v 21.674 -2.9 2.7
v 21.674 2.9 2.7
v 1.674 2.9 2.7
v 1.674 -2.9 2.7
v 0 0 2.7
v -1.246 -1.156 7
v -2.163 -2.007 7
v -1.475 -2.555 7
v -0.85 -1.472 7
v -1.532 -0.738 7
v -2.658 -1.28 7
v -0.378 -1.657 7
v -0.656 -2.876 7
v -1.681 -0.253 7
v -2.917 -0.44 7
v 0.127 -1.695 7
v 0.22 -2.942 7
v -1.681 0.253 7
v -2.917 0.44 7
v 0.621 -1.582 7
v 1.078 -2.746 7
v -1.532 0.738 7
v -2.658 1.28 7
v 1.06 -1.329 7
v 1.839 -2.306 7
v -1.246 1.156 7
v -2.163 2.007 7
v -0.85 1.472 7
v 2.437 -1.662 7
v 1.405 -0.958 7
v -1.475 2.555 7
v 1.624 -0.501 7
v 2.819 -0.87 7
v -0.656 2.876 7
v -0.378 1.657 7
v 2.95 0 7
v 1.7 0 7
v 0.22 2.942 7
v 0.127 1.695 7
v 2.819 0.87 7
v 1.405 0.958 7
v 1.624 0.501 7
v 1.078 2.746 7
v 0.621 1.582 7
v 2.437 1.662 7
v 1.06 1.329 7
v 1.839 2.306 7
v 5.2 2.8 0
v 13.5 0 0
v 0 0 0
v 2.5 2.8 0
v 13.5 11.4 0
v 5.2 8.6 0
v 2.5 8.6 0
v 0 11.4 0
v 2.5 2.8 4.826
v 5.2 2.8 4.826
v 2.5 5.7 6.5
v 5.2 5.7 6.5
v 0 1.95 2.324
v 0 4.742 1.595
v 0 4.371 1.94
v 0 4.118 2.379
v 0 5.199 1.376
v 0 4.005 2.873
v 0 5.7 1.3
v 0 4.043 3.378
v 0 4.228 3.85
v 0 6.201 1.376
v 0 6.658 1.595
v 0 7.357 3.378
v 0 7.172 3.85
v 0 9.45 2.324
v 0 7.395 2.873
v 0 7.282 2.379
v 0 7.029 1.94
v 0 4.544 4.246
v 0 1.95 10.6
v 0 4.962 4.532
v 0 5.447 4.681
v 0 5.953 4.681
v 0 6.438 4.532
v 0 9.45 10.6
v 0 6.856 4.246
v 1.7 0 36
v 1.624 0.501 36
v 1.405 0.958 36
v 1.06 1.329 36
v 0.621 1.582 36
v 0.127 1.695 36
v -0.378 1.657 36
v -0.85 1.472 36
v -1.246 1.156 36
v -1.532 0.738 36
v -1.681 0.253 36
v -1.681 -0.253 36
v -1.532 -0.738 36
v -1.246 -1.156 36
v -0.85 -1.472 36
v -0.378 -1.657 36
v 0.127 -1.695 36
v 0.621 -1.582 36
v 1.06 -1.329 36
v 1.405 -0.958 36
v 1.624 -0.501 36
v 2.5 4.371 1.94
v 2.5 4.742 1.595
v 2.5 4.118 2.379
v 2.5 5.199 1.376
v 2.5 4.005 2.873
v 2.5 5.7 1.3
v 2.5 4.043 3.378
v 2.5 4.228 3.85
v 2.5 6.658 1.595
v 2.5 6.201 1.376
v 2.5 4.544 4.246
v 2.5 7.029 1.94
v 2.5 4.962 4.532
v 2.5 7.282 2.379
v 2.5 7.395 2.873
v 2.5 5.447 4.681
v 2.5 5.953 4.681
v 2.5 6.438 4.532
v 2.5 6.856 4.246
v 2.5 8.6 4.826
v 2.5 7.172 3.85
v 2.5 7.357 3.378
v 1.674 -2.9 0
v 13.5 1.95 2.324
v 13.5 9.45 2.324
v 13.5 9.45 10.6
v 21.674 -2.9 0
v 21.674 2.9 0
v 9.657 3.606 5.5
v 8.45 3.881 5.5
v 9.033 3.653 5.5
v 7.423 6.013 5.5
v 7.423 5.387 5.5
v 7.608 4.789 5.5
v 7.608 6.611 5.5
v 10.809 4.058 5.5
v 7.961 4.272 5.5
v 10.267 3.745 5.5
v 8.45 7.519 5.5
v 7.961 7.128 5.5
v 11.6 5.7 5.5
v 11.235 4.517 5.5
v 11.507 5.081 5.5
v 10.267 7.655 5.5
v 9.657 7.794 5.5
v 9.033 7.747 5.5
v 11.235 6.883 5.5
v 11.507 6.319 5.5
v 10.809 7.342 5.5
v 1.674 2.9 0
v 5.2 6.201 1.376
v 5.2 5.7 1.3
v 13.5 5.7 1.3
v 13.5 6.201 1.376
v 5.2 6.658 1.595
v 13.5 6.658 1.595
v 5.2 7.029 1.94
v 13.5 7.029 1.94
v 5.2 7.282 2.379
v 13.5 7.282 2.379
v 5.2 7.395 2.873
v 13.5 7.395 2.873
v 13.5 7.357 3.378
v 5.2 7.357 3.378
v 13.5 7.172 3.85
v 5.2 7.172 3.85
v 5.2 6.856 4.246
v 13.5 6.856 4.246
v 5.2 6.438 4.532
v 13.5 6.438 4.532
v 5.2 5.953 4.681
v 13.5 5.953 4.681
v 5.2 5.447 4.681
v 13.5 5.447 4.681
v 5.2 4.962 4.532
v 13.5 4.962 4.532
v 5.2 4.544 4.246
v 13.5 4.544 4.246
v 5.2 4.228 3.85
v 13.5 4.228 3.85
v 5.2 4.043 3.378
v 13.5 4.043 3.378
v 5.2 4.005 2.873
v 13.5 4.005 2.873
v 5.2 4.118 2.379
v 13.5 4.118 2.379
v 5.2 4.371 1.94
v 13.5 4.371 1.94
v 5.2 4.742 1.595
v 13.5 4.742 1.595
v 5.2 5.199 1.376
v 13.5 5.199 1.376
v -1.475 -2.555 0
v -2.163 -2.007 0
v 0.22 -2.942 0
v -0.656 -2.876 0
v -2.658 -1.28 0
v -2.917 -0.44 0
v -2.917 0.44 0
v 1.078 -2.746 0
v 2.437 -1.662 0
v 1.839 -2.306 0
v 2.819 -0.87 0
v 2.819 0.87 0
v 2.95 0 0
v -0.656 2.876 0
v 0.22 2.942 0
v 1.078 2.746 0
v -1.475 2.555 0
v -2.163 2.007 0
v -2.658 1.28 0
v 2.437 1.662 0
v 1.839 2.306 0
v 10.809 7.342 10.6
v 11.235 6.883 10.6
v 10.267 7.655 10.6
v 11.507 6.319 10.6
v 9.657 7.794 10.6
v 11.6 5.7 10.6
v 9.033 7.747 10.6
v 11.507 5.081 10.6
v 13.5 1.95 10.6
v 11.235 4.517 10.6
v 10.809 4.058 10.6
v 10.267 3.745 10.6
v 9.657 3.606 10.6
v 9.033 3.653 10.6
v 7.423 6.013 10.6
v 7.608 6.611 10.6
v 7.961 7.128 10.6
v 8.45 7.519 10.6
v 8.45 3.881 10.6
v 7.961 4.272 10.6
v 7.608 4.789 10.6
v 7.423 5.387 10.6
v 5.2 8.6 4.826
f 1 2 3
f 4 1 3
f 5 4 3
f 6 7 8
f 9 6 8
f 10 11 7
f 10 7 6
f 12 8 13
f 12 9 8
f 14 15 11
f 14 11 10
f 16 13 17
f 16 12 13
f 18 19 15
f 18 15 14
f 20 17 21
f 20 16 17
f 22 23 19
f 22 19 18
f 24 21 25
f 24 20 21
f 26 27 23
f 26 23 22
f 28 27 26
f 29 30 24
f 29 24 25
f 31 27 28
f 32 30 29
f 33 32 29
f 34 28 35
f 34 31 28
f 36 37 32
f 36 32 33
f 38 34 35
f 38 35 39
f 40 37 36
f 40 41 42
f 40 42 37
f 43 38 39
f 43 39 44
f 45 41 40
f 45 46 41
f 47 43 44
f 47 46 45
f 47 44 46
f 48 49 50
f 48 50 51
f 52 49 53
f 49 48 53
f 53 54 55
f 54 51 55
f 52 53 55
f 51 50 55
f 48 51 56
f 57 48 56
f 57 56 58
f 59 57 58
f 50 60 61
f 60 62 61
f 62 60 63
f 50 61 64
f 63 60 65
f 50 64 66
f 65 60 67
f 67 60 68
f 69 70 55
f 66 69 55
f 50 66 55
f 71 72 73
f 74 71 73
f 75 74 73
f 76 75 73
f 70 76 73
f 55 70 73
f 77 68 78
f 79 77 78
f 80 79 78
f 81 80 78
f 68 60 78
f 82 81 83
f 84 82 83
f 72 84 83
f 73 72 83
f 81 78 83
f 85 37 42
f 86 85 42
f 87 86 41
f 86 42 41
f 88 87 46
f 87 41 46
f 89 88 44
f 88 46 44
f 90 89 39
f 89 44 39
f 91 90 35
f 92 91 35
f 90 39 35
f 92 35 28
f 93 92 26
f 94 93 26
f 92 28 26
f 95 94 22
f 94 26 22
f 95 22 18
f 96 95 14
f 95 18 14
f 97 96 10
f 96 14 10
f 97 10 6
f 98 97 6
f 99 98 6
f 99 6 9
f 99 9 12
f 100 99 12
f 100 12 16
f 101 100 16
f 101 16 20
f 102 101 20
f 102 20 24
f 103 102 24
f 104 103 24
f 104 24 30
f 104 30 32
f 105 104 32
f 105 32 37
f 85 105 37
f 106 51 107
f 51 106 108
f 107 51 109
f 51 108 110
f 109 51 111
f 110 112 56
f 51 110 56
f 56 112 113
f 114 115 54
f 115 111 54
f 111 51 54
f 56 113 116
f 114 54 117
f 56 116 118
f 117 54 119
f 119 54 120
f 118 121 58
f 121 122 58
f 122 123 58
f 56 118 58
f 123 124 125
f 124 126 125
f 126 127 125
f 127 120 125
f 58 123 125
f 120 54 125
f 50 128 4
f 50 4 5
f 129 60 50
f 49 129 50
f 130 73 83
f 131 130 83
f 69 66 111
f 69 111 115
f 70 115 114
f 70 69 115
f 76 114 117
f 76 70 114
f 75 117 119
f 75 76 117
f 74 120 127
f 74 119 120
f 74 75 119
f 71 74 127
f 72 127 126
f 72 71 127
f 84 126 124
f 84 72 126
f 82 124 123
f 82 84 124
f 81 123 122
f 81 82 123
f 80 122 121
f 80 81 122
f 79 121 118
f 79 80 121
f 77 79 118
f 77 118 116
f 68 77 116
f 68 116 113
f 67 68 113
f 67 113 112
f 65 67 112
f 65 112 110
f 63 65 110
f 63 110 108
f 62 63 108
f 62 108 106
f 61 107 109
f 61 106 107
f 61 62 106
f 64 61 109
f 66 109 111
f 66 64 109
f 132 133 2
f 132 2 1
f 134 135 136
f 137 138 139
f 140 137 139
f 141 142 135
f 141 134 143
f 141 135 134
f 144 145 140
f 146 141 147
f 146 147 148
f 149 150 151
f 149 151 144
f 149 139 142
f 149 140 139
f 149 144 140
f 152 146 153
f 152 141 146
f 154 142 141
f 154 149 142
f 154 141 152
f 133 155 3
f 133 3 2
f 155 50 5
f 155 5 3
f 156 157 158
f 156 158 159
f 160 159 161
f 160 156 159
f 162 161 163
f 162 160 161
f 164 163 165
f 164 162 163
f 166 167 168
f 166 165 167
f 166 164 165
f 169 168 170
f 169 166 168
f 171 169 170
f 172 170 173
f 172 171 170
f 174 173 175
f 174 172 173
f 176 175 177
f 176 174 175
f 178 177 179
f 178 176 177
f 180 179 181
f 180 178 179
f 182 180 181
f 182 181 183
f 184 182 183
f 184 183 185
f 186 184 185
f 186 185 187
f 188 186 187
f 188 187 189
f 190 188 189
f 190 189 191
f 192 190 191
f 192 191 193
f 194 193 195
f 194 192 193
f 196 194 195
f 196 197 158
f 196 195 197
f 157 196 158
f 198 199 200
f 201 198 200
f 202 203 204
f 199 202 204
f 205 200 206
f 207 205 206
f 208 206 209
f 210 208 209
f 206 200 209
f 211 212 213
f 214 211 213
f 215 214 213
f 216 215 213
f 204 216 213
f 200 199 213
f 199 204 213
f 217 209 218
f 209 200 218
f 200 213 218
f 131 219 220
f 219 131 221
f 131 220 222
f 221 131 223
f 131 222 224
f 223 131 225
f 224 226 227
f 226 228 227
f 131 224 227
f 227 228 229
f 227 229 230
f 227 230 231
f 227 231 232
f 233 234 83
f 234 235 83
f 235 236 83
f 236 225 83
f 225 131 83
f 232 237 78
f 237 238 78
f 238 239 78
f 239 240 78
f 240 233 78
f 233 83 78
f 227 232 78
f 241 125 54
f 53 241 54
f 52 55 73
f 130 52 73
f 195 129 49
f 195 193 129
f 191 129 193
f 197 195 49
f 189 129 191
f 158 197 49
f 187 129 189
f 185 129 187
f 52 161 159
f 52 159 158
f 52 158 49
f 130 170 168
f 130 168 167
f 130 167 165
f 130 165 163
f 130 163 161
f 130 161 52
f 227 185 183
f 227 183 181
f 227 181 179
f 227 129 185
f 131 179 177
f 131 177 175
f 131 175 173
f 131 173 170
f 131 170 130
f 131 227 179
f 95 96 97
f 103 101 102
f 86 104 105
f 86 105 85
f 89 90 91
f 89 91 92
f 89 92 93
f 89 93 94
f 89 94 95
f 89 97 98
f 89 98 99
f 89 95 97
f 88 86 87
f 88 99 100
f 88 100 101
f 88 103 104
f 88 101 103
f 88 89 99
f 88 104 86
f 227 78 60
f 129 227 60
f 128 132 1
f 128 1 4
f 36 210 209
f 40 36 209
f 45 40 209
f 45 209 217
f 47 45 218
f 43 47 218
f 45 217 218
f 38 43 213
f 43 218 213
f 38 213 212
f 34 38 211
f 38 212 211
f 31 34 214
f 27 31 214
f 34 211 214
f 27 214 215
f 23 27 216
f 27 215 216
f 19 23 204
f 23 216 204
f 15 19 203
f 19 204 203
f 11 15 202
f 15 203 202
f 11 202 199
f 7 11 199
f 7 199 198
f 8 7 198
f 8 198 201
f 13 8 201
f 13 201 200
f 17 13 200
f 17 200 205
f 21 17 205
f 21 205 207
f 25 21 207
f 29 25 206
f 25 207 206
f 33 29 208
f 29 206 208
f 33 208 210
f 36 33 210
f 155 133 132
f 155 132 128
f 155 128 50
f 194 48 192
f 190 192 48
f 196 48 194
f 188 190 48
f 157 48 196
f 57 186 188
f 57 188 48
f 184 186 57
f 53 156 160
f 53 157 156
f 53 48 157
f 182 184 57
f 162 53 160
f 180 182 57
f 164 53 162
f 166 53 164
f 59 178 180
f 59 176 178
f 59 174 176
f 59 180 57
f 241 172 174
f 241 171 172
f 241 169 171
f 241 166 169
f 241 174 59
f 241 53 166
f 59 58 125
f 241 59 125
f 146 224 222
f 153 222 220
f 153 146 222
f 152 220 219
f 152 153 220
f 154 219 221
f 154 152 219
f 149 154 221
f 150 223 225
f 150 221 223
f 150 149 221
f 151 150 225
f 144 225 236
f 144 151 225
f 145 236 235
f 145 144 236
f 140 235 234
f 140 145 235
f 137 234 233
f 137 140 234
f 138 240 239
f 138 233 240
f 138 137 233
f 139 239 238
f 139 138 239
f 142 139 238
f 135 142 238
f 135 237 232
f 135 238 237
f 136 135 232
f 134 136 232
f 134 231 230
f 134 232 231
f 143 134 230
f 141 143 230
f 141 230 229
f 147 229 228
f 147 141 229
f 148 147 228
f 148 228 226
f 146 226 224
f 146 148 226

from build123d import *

# Parameters (mm, degrees)
CYLINDER_R           = 2.95
CYLINDER_DEPTH       = 7
CYLINDER001_R        = 1.7
CYLINDER001_DEPTH    = 30
PAD002_DEPTH         = 2.7
CLONE001_PITCH_ANGLE = 90
CLONE_PITCH_ANGLE    = 90
CYLINDER002_R        = 2.1
CYLINDER002_DEPTH    = 10
PAD_DEPTH            = 13.5


with BuildPart() as m3bolthead:
    # Cylinder → Cylinder (new body)
    with BuildSketch(Plane.XY):
        Circle(CYLINDER_R)
    extrude(amount=CYLINDER_DEPTH)


with BuildPart() as m3bolt:
    # Cylinder001 → Cylinder001 (new body)
    with BuildSketch(Plane.XY.offset(6)):
        Circle(CYLINDER001_R)
    extrude(amount=CYLINDER001_DEPTH)

    # Fusion: union M3BoltHead
    add(m3bolthead.part)


with BuildPart() as m3nuthousing:
    # Sketch003 → Pad002 (new body)
    with BuildSketch(Plane.XY):
        Polygon((0, 0), (1.674316, 2.9), (21.674316, 2.9), (21.674316, -2.9), (1.674316, -2.9), align=None)
    extrude(amount=PAD002_DEPTH)


with BuildPart() as clone_of_m3bolt:
    # Clone001 base: copy of M3Bolt
    add(m3bolt.part)


with BuildPart() as clone_of_m3bolt_1:
    # Clone001 pitch: moved
    add(clone_of_m3bolt.part.rotate(Axis((0, 0, 0), (0, 1, 0)), CLONE001_PITCH_ANGLE))


with BuildPart() as clone_of_m3bolt_2:
    # Clone001 placement: moved
    add(clone_of_m3bolt_1.part.moved(Location((-16.5, 5.7, 3))))


with BuildPart() as clone_of_m3nuthousing:
    # Clone base: copy of M3NutHousing
    add(m3nuthousing.part)


with BuildPart() as clone_of_m3nuthousing_1:
    # Clone pitch: moved
    add(clone_of_m3nuthousing.part.rotate(Axis((0, 0, 0), (0, 1, 0)), CLONE_PITCH_ANGLE))


with BuildPart() as clone_of_m3nuthousing_2:
    # Clone placement: moved
    add(clone_of_m3nuthousing_1.part.moved(Location((2.5, 5.7, 6.5))))


with BuildPart() as fusion001:
    # Cylinder002 → Cylinder002 (new body)
    with BuildSketch(Plane(origin=(9.5, 5.7, 5.5), x_dir=(1, 0, 0), z_dir=(0, 0, 1))):
        Circle(CYLINDER002_R)
    extrude(amount=CYLINDER002_DEPTH)

    # Fusion001: union Clone of M3Bolt, Clone of M3NutHousing
    add(clone_of_m3bolt_2.part)
    add(clone_of_m3nuthousing_2.part)


with BuildPart() as art3tensionerbody:
    # Sketch027 → Pad (new body)
    with BuildSketch(Plane.YZ):
        Polygon((1.95, 2.32392), (0, 0), (11.4, 0), (9.45, 2.32392), (9.45, 10.6), (1.95, 10.6), align=None)
    extrude(amount=PAD_DEPTH)

    # Cut: cut Fusion001
    add(fusion001.part, mode=Mode.SUBTRACT)


solid = Compound([m3bolt.part, m3nuthousing.part, art3tensionerbody.part])
